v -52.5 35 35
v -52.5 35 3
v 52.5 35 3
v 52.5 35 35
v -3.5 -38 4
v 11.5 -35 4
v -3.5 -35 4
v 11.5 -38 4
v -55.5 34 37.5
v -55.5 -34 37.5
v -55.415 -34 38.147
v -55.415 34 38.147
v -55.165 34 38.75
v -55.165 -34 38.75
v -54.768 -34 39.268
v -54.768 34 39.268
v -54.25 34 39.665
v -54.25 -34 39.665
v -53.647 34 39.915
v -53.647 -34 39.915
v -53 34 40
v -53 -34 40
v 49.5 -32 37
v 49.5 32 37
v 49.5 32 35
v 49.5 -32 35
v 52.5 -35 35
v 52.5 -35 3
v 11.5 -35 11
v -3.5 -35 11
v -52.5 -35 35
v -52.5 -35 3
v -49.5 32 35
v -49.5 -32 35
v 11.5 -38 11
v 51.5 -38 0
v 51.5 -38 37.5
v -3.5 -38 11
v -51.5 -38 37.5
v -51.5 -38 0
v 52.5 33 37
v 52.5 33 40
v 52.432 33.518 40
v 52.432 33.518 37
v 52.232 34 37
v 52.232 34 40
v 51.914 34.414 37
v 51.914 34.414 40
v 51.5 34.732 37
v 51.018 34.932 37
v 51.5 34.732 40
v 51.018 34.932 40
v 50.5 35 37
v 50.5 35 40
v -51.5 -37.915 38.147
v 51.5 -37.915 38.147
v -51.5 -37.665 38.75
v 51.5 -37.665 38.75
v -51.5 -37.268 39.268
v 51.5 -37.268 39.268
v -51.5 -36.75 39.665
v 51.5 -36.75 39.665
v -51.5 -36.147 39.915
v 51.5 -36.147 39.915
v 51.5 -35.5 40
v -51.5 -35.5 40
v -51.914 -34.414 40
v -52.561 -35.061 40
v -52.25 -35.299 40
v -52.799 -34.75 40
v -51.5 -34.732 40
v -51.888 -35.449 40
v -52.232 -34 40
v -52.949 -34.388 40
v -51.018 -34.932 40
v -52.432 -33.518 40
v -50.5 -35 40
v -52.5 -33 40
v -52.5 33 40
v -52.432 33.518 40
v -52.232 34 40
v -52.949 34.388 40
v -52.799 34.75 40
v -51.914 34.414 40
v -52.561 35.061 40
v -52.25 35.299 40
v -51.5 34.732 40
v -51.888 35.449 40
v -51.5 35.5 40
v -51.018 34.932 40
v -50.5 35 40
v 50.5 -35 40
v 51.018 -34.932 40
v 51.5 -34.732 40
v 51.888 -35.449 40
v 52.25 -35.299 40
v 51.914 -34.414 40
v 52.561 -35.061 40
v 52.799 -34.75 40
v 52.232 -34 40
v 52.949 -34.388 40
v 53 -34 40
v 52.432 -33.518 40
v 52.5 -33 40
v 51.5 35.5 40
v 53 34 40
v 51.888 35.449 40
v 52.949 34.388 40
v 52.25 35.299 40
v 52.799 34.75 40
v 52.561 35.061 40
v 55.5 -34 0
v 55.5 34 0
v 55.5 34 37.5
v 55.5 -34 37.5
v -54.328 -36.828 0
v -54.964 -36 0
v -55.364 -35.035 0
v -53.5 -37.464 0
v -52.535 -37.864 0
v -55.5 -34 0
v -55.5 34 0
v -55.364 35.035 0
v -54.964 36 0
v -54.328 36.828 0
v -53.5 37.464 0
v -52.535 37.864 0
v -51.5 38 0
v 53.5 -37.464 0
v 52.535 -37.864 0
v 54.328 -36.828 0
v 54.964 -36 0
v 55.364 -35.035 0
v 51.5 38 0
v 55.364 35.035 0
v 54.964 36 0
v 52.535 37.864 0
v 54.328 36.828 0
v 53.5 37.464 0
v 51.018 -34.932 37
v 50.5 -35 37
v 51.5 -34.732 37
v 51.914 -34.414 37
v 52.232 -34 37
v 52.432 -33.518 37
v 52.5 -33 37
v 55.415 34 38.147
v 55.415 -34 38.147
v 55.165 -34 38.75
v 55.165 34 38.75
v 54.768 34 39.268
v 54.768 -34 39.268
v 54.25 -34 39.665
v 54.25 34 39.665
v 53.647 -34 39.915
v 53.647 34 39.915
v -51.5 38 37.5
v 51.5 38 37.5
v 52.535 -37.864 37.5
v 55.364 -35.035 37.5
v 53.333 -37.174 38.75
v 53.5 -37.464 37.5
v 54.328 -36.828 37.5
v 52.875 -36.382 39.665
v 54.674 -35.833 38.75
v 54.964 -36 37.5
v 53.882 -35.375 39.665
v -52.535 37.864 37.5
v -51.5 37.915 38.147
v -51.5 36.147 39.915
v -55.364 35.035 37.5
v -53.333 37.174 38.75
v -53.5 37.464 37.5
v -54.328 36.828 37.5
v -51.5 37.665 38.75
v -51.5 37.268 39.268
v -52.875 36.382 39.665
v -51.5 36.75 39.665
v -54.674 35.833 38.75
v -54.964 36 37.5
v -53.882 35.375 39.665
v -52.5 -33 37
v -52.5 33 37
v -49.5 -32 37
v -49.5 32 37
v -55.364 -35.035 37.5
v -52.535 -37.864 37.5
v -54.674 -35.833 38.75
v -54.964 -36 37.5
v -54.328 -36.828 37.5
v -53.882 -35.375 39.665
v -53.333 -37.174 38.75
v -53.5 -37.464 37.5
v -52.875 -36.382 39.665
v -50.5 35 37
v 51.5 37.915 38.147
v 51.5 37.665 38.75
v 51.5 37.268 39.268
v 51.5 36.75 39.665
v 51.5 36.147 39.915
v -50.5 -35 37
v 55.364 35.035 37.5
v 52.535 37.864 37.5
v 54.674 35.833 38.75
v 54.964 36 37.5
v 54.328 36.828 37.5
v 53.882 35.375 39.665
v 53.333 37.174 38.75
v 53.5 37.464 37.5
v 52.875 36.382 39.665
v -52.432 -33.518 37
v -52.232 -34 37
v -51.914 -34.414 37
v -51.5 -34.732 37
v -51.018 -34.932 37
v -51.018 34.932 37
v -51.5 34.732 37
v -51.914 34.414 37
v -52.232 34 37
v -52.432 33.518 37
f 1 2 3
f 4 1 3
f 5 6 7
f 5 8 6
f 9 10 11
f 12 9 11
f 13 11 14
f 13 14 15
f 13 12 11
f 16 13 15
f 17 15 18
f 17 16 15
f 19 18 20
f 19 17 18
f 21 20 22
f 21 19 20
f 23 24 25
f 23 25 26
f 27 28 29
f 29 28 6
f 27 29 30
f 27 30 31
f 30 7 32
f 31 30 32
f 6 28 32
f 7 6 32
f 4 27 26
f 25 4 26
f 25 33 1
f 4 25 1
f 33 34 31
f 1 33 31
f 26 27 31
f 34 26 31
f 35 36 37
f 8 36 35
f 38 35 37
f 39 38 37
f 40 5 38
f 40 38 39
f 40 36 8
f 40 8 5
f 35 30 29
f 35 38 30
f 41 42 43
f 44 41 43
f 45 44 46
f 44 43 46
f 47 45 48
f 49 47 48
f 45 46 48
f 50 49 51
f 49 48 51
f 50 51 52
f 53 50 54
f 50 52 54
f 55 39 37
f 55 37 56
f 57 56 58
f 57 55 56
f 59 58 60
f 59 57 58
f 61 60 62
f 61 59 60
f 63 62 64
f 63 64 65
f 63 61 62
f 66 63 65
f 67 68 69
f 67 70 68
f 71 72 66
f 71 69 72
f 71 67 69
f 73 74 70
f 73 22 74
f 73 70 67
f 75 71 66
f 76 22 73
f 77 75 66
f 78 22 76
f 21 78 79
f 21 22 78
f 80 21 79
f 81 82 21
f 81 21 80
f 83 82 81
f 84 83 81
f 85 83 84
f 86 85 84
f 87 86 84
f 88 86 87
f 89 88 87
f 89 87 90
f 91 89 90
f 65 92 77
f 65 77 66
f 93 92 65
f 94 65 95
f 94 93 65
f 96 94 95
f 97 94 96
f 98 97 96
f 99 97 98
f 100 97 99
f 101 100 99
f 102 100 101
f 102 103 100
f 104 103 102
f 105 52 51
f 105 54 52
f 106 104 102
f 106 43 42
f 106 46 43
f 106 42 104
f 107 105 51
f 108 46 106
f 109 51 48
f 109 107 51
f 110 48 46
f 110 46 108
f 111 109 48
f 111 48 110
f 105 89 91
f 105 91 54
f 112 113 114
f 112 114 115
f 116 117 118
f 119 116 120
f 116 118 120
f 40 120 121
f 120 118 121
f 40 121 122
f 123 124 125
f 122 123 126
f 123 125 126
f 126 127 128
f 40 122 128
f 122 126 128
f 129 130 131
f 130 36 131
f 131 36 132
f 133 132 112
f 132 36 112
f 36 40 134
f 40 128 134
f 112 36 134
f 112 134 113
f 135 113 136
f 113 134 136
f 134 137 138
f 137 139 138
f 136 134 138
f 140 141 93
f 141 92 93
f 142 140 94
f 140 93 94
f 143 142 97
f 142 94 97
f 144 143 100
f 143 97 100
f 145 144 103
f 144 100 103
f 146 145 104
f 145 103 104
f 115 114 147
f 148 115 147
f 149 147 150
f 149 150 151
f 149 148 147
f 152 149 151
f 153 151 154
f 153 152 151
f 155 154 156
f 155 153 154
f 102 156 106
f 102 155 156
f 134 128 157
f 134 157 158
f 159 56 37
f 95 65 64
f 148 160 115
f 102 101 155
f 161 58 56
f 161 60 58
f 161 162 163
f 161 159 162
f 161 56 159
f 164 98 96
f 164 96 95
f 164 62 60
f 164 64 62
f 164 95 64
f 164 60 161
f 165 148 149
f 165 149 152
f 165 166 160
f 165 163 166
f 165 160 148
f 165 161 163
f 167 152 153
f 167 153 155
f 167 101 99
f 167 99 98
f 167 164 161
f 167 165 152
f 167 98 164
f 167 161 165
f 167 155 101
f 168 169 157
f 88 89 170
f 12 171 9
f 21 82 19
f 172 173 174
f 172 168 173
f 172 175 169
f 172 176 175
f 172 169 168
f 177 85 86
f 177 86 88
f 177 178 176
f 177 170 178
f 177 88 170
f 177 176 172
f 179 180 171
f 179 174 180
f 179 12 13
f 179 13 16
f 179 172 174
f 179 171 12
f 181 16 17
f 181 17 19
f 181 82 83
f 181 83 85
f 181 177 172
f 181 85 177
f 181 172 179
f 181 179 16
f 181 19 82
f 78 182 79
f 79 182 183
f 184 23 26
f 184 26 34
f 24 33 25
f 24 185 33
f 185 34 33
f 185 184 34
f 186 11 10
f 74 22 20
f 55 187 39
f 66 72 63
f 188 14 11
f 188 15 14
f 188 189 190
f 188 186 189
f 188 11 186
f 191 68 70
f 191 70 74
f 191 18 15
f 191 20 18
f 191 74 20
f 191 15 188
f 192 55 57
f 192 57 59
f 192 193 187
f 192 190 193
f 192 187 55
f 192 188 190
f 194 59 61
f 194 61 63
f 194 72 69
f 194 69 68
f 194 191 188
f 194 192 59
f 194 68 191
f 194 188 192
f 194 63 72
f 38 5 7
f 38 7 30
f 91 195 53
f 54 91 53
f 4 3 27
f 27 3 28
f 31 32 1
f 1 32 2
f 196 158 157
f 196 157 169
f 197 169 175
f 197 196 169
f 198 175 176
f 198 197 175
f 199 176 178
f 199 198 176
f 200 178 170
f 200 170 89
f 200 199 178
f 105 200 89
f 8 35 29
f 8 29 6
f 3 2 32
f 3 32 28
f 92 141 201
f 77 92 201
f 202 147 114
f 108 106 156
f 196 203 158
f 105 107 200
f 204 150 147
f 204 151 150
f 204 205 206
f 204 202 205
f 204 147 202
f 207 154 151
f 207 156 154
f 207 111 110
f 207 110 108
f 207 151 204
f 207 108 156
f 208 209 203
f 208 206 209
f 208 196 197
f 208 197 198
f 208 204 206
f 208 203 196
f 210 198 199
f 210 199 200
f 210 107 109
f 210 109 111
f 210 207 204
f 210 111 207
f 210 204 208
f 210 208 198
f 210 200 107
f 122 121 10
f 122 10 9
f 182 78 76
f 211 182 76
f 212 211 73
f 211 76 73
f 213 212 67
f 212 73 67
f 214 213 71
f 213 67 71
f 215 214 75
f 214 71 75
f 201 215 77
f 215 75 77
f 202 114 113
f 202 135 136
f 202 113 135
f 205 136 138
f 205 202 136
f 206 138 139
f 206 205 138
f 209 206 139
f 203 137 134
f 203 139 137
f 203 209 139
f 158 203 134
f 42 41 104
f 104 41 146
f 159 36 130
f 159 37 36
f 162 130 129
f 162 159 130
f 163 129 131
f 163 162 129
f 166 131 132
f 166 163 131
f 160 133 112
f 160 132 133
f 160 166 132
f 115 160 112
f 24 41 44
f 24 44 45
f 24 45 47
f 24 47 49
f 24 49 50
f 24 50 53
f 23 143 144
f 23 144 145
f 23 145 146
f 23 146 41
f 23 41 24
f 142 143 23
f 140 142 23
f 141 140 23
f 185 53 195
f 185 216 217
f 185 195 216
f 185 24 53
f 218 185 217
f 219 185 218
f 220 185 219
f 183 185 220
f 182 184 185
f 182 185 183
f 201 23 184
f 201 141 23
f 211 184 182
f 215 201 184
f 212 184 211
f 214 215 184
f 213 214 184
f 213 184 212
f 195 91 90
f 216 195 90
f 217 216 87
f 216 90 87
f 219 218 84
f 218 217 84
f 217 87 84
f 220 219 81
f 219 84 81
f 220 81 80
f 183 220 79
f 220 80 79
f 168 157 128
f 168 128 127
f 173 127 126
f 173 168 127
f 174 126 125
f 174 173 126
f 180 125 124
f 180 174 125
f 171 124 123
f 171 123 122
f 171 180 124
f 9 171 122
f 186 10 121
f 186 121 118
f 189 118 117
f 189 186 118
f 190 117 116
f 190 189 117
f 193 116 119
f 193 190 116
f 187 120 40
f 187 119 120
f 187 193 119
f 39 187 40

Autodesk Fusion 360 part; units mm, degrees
sketch "Sketch1" plane through (0, 0, 0) normal (0, 0, 1) x (1, 0, 0)
  line L0 (-52.5, 35) -> (52.5, 35)
  line L1 (52.5, 35) -> (52.5, -35)
  line L2 (52.5, -35) -> (-52.5, -35)
  line L3 (-52.5, -35) -> (-52.5, 35)
  line L4 (-55.5, 38) -> (55.5, 38)
  line L5 (55.5, 38) -> (55.5, -38)
  line L6 (55.5, -38) -> (-55.5, -38)
  line L7 (-55.5, -38) -> (-55.5, 38)
  dimension "d1" = 105
  dimension "d2" = 70
  dimension "d3" = 35
  dimension "d4" = 52.5
  dimension "d5" = 111
  dimension "d6" = 76
  dimension "d7" = 3
  dimension "d8" = 3
extrude "Extrude1" add sketch "Sketch1" along normal blind 3 contours L0 L1 L2 L3 makes body 1
extrude "Extrude2" add sketch "Sketch1" along normal blind 40 bodies 1
fillet "Fillet1" radius 4 4 edges at (55.5, -38, 20) (55.5, 38, 20) (-55.5, -38, 20) (-55.5, 38, 20) on bodies 1
fillet "Fillet2" radius 2.5 8 edges at (54.3284, -36.8284, 40) (55.5, 0, 40) (54.3284, 36.8284, 40) (0, 38, 40) (-54.3284, 36.8284, 40) (-55.5, 0, 40) (-54.3284, -36.8284, 40) (0, -38, 40) on bodies 1
sketch "Sketch3" plane through (0, -38, 0) normal (0, -1, 0) x (1, 0, 0)
  line L0 (51.5, 37.5) -> (-51.5, 37.5)
  line L1 (-51.5, 37.5) -> (-51.5, 0)
  line L2 (-51.5, 0) -> (51.5, 0)
  line L3 (51.5, 0) -> (51.5, 37.5)
  line L4 (-3.5, 11) -> (11.5, 11)
  line L5 (11.5, 11) -> (11.5, 4)
  line L6 (11.5, 4) -> (-3.5, 4)
  line L7 (-3.5, 4) -> (-3.5, 11)
  dimension "d17" = 7
  dimension "d19" = 40
  dimension "d22" = 11
  dimension "d23" = 15
extrude "Extrude3" cut sketch "Sketch3" against normal blind 10 contours L4 L5 L6 L7 bodies 1
sketch "Sketch5" plane through (0, 0, 40) normal (0, 0, 1) x (-1, 0, 0)
  line L0 (-52.5, 35) -> (52.5, 35)
  line L1 (52.5, 35) -> (52.5, -35)
  line L2 (52.5, -35) -> (-52.5, -35)
  line L3 (-52.5, -35) -> (-52.5, 35)
  arc A0 (-51.5, 35.5) -> (-53, 34) centre (-51.5, 34) ccw
  line L4 (-53, 34) -> (-53, -34)
  arc A1 (-53, -34) -> (-51.5, -35.5) centre (-51.5, -34) ccw
  line L5 (-51.5, -35.5) -> (51.5, -35.5)
  arc A2 (51.5, -35.5) -> (53, -34) centre (51.5, -34) ccw
  line L6 (53, -34) -> (53, 34)
  arc A3 (53, 34) -> (51.5, 35.5) centre (51.5, 34) ccw
  line L7 (51.5, 35.5) -> (-51.5, 35.5)
extrude "Extrude4" add sketch "Sketch5" against normal blind 2 separate body contours L0 L1 L2 L3 makes body 2
move_body "Move1" bodies 2 to x (1, 0, 0) y (0, 1, 0) z (0, 0, 1) at (0, 0, -3)
shell "Shell1" thickness 3 removed faces 2 at (17.5, -11.6667, 37) at (17.5, -11.6667, 35) on bodies 2
combine "Combine1" operation add target body 1 tool bodies 2
fillet "Fillet3" radius 2 4 edges at (-52.5, 35, 38.5) (-52.5, -35, 38.5) (52.5, -35, 38.5) (52.5, 35, 38.5) on bodies 1
